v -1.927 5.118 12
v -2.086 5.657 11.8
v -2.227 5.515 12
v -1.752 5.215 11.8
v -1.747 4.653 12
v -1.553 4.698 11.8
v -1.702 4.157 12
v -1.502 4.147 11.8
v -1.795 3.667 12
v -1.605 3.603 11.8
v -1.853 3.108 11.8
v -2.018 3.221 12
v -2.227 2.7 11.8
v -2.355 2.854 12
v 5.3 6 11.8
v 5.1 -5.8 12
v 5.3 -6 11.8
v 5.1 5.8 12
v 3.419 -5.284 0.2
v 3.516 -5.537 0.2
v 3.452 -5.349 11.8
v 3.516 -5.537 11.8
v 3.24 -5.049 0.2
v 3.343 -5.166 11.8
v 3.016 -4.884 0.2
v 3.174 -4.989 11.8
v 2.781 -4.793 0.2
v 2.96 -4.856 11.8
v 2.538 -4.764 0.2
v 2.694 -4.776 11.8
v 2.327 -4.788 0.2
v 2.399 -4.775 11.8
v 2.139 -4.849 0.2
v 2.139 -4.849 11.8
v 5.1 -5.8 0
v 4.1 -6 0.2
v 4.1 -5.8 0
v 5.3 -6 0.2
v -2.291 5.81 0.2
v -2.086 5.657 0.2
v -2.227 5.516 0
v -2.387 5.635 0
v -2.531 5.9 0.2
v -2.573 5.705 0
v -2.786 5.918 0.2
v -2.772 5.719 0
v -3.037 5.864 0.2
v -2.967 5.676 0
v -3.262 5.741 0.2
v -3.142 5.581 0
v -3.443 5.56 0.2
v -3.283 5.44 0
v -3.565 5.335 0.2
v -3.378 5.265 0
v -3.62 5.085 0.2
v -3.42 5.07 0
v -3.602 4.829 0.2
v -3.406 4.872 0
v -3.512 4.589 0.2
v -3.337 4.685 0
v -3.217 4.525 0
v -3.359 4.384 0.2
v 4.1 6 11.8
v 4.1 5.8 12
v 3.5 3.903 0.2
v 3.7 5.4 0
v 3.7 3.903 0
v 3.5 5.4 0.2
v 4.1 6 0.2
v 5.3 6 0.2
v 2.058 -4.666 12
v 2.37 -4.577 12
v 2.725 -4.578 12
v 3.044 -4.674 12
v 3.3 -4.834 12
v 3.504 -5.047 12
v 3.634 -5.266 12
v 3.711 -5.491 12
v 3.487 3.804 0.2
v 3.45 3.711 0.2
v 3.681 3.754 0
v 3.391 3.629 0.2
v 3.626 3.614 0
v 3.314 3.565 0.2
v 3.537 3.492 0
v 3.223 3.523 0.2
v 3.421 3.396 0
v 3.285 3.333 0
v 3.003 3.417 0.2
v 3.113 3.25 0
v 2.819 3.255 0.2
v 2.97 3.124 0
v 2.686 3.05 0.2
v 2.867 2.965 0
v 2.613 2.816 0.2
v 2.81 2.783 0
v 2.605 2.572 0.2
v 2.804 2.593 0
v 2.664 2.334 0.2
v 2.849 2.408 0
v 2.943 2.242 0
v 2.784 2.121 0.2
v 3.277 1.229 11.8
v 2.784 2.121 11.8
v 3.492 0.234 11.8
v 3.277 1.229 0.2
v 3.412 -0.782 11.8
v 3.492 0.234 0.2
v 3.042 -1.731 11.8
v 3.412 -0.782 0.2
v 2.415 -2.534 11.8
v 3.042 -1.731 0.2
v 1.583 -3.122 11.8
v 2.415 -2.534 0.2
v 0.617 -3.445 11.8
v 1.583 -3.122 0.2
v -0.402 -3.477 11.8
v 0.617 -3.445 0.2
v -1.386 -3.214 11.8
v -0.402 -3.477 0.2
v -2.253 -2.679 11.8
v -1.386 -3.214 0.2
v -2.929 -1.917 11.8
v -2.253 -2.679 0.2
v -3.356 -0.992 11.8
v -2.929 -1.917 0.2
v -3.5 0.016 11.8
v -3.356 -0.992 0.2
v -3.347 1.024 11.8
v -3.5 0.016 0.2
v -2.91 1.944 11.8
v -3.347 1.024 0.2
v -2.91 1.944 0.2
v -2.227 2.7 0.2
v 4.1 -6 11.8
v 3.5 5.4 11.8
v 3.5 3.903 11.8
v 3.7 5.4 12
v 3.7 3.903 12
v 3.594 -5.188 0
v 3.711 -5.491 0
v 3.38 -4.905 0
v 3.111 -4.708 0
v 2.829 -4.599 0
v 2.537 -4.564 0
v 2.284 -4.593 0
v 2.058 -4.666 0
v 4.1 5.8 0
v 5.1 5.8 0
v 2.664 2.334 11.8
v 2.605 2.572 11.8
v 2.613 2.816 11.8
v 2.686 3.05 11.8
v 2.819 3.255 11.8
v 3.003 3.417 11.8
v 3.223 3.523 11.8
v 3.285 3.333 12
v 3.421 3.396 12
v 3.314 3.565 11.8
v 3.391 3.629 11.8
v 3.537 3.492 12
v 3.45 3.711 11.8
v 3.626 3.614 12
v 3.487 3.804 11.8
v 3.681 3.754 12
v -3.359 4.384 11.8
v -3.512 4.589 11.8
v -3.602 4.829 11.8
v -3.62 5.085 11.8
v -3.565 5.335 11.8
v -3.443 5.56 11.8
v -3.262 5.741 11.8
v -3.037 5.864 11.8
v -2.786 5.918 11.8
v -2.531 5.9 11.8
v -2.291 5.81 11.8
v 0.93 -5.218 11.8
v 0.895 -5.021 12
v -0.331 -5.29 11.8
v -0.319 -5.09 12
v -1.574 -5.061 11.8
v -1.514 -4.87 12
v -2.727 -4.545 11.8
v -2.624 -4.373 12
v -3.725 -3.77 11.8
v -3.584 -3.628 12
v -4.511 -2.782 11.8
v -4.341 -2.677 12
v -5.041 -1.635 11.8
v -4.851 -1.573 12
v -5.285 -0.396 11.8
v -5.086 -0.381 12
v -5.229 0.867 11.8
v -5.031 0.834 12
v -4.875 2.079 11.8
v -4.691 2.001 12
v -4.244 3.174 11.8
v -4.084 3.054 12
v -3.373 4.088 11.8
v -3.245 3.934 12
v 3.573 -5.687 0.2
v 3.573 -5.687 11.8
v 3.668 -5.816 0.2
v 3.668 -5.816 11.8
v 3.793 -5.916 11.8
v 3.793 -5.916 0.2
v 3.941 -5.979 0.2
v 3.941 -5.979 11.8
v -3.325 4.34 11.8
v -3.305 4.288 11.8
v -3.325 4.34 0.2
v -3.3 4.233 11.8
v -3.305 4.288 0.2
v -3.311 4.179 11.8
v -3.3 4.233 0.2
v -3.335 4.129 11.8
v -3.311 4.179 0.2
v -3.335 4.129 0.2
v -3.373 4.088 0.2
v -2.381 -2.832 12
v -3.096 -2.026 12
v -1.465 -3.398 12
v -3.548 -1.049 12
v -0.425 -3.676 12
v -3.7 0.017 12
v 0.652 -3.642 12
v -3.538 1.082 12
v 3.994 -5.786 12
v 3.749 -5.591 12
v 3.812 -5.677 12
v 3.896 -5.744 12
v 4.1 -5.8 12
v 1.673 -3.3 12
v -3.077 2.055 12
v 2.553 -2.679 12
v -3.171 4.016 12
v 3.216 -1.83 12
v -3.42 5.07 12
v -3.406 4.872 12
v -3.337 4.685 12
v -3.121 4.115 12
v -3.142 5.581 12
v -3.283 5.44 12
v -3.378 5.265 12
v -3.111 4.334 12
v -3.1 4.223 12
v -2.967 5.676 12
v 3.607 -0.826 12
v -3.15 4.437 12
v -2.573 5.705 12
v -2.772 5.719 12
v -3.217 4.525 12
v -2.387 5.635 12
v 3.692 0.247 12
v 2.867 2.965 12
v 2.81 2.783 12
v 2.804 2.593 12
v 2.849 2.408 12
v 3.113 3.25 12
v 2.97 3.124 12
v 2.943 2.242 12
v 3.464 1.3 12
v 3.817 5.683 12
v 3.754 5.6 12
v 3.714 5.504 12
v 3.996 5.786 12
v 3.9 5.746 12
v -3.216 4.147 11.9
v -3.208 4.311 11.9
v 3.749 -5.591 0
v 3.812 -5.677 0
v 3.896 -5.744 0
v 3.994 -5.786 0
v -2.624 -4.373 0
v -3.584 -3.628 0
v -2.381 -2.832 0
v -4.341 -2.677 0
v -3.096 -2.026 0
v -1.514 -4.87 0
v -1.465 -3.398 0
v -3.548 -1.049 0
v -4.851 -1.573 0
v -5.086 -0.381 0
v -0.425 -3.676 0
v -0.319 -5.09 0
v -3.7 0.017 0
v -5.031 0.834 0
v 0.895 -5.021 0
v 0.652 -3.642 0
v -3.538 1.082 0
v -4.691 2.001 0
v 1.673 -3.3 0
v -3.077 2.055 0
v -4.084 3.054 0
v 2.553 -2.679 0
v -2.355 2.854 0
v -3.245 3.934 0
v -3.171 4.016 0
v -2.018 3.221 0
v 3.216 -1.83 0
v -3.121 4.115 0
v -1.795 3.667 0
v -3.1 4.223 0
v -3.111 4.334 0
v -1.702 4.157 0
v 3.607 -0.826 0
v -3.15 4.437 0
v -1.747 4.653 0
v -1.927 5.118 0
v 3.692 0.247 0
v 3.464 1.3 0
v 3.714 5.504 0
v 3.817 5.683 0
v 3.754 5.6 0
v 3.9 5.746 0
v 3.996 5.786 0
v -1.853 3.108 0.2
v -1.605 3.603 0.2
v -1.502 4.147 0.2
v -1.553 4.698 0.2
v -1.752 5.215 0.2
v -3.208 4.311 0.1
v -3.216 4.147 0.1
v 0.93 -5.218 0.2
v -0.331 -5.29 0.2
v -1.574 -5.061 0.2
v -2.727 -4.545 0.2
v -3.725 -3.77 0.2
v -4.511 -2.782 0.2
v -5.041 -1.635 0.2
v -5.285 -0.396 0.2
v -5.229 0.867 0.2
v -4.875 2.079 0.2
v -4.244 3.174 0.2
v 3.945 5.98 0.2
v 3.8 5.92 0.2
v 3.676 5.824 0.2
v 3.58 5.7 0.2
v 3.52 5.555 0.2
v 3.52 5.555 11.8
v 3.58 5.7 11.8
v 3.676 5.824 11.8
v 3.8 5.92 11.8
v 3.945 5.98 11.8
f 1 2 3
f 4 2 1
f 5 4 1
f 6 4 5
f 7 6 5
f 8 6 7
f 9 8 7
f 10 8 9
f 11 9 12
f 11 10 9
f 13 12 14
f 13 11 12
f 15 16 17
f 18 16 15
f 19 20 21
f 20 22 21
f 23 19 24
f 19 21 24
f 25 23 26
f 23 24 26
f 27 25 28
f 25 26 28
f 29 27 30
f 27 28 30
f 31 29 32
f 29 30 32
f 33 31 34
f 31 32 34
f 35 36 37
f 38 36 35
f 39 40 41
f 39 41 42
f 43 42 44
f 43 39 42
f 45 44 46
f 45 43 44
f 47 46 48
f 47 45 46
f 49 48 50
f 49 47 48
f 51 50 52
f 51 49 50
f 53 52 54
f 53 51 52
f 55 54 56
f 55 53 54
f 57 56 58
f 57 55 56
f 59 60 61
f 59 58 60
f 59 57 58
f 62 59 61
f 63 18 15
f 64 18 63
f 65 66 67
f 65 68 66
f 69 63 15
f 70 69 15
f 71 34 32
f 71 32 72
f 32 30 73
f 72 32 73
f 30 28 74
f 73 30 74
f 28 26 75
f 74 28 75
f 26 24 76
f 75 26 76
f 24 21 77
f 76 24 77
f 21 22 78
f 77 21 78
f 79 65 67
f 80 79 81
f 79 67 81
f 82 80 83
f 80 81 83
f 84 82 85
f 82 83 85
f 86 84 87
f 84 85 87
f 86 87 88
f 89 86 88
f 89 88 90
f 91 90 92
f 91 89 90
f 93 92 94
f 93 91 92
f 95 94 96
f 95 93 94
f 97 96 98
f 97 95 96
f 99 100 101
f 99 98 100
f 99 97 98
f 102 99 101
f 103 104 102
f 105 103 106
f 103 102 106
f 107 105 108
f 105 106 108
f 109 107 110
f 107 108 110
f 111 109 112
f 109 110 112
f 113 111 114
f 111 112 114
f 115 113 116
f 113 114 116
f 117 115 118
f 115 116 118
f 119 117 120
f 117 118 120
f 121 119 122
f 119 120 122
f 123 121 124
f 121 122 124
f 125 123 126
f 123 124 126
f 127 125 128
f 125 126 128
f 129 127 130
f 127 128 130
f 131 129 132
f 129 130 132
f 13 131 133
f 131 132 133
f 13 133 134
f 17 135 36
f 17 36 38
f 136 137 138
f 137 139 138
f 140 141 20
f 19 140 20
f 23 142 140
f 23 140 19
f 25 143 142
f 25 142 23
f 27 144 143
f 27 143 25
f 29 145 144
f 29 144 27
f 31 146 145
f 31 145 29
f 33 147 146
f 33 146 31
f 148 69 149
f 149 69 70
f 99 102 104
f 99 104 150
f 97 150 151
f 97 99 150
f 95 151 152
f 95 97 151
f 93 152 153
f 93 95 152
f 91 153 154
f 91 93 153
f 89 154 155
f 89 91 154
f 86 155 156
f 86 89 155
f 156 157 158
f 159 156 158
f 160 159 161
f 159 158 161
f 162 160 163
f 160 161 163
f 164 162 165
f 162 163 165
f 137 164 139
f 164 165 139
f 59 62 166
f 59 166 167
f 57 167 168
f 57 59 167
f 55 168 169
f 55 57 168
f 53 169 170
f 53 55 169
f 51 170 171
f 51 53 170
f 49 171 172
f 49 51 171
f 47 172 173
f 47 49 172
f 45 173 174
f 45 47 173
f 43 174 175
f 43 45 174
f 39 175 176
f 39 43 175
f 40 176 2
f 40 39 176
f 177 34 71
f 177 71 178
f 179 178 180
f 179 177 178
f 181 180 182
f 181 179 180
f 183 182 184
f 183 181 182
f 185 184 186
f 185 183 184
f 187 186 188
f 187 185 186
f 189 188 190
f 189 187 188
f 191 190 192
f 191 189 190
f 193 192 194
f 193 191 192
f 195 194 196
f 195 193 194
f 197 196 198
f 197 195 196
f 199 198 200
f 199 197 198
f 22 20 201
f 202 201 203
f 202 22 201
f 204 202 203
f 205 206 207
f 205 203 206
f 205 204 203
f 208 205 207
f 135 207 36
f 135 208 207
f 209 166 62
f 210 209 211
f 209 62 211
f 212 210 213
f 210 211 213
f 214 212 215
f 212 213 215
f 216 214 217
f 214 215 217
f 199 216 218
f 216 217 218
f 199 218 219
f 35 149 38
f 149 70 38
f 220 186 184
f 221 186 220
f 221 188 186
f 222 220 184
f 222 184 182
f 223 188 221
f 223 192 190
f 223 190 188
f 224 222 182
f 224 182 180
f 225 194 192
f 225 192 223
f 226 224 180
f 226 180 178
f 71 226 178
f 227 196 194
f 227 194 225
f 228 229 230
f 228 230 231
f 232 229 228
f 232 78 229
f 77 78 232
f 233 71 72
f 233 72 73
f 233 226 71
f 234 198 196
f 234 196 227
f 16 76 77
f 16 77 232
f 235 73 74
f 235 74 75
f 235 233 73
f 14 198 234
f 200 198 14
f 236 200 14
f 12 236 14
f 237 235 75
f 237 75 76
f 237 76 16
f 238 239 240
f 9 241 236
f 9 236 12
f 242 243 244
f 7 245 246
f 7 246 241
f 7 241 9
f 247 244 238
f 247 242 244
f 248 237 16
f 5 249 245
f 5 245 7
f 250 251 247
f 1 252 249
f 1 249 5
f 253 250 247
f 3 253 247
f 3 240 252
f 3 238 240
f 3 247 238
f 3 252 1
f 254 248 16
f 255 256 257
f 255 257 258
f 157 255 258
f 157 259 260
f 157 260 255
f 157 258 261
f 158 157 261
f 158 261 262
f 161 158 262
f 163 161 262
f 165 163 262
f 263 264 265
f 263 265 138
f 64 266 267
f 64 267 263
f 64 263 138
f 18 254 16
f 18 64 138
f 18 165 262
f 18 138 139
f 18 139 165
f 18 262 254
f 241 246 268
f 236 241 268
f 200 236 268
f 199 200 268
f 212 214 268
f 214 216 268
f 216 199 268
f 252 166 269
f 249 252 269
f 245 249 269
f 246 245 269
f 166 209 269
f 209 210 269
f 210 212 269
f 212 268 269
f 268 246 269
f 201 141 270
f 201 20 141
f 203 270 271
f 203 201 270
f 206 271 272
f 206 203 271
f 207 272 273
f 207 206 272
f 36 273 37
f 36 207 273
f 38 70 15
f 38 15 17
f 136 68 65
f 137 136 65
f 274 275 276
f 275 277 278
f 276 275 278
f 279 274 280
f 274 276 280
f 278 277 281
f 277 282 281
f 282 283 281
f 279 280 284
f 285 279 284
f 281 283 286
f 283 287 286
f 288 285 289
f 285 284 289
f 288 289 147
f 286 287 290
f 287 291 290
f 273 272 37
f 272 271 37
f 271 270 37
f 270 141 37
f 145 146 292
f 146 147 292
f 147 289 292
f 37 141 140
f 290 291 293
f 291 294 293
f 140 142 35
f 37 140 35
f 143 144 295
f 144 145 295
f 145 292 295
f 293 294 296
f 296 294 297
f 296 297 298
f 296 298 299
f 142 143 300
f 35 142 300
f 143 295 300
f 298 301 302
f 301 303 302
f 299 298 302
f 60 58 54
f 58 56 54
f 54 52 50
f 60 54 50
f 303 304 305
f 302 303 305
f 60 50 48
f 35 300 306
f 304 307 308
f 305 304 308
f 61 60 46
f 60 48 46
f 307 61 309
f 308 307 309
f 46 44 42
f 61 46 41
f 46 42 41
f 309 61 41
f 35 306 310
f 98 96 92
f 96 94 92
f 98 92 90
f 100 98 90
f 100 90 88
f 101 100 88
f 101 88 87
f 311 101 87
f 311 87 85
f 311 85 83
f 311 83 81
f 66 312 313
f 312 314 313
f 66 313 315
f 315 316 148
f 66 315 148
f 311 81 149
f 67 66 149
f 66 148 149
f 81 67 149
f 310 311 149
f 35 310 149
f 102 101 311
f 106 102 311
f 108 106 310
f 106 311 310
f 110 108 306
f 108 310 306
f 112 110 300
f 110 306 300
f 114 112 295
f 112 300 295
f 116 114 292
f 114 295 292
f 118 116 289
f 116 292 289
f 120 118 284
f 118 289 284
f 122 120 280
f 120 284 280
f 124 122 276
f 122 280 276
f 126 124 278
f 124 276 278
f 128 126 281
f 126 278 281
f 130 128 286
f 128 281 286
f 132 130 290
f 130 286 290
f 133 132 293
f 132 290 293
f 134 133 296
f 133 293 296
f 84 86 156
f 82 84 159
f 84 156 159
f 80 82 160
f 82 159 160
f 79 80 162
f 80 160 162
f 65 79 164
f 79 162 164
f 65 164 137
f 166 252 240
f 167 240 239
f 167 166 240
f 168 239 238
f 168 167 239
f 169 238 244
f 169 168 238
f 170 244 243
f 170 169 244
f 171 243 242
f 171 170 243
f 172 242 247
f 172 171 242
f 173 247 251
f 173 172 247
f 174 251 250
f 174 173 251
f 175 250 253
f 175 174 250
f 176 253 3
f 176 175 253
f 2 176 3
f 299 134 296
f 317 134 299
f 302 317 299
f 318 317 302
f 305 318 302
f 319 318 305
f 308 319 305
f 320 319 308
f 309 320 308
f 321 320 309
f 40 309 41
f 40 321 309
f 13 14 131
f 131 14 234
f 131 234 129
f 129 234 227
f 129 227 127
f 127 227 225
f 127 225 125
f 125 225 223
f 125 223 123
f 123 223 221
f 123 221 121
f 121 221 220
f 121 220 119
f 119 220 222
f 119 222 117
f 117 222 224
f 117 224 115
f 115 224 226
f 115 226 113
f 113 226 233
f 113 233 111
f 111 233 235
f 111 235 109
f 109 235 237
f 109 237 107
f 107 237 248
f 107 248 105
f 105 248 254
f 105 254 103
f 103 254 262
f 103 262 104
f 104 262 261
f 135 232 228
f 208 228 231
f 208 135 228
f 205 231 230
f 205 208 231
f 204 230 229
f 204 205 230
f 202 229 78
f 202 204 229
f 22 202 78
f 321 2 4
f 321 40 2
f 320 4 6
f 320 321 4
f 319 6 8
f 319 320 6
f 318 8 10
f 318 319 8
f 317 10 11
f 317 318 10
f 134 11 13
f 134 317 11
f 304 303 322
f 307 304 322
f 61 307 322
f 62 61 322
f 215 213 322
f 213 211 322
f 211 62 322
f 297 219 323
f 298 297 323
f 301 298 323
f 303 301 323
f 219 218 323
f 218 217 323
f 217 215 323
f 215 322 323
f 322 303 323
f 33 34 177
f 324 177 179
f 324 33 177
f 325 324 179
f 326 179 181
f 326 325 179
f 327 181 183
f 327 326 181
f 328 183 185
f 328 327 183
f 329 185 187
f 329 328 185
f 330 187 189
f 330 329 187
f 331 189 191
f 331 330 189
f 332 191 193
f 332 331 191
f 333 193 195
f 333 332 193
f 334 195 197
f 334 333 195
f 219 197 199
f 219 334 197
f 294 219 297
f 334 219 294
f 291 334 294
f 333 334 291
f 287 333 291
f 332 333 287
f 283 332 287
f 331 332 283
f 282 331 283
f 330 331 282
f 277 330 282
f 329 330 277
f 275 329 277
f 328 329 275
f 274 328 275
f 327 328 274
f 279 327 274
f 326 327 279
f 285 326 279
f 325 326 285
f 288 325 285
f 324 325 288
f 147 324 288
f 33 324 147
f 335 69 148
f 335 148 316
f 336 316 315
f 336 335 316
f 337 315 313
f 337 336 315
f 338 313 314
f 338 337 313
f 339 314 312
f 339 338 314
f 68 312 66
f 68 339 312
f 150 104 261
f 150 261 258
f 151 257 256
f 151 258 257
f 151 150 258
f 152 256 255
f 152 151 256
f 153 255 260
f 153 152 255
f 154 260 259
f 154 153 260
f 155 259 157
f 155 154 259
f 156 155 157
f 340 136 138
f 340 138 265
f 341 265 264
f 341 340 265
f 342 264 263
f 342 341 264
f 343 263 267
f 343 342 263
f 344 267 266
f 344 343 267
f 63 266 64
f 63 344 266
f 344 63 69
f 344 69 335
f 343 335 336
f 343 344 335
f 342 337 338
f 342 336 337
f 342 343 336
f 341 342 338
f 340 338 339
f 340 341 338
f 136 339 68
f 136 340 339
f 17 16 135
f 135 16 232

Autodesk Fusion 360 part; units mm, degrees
sketch "Náčrt1" plane through (0, 0, 0) normal (0, 0, 1) x (1, 0, 0)
  circle A0 centre (0, 0) radius 3.5
  circle A1 centre (0, 0) radius 5.3
  line L0 (3.5, 6) -> (3.5, -6)
  line L1 (5.3, 6) -> (5.3, -6)
  line L2 (3.5, 6) -> (5.3, 6)
  line L3 (3.5, -6) -> (5.3, -6)
  line L4 (-1.5, 6) -> (-1.5, 0) construction
  circle A2 centre (-3.5, 4.2426) radius 2
  circle A3 centre (-3.5, 4.2426) radius 0.2
  line L5 (-3.5, 4.2426) -> (-2.0858, 5.6569) construction
  line L6 (-3.5, 4.2426) -> (-1.5, 4.2426) construction
  circle A4 centre (-2.7222, 5.0205) radius 0.9
  circle A5 centre (3.5, 2.6665) radius 0.9
  point P0 (3.5, 0)
  dimension "d1" = 7
  dimension "d2" = 10.6
  dimension "d3" = 12
  dimension "d4" = 5
  dimension "d5" = 4
  dimension "d6" = 45
extrude "Vysunutí1" add sketch "Náčrt1" along normal blind 12 contours A0 A1 L0 A2 | A0 L0 A5 | A1 L0 A5 | L0 A5 | A1 A2 A4 | L0 A5 | A1 L0 L1 L3 | A1 L0 A5 | A1 L0 L1 L2 | A1 A3 A4 | A1 A2 A4 | A1 A4 | A1 A4
fillet "Zaoblení1" radius 0.6 2 edges at (3.5, -6, 6) (3.5, 6, 6)
fillet "Zaoblení1" radius 1 1 edges at (3.5, -3.9799, 6)
fillet "Zaoblení1" radius 0.4 1 edges at (3.5, 3.5665, 6)
chamfer "Zkosení2" distance 0.2 angle 45 2 faces at (4.6974, 0.0779, 0) (4.6974, 0.0779, 12)
